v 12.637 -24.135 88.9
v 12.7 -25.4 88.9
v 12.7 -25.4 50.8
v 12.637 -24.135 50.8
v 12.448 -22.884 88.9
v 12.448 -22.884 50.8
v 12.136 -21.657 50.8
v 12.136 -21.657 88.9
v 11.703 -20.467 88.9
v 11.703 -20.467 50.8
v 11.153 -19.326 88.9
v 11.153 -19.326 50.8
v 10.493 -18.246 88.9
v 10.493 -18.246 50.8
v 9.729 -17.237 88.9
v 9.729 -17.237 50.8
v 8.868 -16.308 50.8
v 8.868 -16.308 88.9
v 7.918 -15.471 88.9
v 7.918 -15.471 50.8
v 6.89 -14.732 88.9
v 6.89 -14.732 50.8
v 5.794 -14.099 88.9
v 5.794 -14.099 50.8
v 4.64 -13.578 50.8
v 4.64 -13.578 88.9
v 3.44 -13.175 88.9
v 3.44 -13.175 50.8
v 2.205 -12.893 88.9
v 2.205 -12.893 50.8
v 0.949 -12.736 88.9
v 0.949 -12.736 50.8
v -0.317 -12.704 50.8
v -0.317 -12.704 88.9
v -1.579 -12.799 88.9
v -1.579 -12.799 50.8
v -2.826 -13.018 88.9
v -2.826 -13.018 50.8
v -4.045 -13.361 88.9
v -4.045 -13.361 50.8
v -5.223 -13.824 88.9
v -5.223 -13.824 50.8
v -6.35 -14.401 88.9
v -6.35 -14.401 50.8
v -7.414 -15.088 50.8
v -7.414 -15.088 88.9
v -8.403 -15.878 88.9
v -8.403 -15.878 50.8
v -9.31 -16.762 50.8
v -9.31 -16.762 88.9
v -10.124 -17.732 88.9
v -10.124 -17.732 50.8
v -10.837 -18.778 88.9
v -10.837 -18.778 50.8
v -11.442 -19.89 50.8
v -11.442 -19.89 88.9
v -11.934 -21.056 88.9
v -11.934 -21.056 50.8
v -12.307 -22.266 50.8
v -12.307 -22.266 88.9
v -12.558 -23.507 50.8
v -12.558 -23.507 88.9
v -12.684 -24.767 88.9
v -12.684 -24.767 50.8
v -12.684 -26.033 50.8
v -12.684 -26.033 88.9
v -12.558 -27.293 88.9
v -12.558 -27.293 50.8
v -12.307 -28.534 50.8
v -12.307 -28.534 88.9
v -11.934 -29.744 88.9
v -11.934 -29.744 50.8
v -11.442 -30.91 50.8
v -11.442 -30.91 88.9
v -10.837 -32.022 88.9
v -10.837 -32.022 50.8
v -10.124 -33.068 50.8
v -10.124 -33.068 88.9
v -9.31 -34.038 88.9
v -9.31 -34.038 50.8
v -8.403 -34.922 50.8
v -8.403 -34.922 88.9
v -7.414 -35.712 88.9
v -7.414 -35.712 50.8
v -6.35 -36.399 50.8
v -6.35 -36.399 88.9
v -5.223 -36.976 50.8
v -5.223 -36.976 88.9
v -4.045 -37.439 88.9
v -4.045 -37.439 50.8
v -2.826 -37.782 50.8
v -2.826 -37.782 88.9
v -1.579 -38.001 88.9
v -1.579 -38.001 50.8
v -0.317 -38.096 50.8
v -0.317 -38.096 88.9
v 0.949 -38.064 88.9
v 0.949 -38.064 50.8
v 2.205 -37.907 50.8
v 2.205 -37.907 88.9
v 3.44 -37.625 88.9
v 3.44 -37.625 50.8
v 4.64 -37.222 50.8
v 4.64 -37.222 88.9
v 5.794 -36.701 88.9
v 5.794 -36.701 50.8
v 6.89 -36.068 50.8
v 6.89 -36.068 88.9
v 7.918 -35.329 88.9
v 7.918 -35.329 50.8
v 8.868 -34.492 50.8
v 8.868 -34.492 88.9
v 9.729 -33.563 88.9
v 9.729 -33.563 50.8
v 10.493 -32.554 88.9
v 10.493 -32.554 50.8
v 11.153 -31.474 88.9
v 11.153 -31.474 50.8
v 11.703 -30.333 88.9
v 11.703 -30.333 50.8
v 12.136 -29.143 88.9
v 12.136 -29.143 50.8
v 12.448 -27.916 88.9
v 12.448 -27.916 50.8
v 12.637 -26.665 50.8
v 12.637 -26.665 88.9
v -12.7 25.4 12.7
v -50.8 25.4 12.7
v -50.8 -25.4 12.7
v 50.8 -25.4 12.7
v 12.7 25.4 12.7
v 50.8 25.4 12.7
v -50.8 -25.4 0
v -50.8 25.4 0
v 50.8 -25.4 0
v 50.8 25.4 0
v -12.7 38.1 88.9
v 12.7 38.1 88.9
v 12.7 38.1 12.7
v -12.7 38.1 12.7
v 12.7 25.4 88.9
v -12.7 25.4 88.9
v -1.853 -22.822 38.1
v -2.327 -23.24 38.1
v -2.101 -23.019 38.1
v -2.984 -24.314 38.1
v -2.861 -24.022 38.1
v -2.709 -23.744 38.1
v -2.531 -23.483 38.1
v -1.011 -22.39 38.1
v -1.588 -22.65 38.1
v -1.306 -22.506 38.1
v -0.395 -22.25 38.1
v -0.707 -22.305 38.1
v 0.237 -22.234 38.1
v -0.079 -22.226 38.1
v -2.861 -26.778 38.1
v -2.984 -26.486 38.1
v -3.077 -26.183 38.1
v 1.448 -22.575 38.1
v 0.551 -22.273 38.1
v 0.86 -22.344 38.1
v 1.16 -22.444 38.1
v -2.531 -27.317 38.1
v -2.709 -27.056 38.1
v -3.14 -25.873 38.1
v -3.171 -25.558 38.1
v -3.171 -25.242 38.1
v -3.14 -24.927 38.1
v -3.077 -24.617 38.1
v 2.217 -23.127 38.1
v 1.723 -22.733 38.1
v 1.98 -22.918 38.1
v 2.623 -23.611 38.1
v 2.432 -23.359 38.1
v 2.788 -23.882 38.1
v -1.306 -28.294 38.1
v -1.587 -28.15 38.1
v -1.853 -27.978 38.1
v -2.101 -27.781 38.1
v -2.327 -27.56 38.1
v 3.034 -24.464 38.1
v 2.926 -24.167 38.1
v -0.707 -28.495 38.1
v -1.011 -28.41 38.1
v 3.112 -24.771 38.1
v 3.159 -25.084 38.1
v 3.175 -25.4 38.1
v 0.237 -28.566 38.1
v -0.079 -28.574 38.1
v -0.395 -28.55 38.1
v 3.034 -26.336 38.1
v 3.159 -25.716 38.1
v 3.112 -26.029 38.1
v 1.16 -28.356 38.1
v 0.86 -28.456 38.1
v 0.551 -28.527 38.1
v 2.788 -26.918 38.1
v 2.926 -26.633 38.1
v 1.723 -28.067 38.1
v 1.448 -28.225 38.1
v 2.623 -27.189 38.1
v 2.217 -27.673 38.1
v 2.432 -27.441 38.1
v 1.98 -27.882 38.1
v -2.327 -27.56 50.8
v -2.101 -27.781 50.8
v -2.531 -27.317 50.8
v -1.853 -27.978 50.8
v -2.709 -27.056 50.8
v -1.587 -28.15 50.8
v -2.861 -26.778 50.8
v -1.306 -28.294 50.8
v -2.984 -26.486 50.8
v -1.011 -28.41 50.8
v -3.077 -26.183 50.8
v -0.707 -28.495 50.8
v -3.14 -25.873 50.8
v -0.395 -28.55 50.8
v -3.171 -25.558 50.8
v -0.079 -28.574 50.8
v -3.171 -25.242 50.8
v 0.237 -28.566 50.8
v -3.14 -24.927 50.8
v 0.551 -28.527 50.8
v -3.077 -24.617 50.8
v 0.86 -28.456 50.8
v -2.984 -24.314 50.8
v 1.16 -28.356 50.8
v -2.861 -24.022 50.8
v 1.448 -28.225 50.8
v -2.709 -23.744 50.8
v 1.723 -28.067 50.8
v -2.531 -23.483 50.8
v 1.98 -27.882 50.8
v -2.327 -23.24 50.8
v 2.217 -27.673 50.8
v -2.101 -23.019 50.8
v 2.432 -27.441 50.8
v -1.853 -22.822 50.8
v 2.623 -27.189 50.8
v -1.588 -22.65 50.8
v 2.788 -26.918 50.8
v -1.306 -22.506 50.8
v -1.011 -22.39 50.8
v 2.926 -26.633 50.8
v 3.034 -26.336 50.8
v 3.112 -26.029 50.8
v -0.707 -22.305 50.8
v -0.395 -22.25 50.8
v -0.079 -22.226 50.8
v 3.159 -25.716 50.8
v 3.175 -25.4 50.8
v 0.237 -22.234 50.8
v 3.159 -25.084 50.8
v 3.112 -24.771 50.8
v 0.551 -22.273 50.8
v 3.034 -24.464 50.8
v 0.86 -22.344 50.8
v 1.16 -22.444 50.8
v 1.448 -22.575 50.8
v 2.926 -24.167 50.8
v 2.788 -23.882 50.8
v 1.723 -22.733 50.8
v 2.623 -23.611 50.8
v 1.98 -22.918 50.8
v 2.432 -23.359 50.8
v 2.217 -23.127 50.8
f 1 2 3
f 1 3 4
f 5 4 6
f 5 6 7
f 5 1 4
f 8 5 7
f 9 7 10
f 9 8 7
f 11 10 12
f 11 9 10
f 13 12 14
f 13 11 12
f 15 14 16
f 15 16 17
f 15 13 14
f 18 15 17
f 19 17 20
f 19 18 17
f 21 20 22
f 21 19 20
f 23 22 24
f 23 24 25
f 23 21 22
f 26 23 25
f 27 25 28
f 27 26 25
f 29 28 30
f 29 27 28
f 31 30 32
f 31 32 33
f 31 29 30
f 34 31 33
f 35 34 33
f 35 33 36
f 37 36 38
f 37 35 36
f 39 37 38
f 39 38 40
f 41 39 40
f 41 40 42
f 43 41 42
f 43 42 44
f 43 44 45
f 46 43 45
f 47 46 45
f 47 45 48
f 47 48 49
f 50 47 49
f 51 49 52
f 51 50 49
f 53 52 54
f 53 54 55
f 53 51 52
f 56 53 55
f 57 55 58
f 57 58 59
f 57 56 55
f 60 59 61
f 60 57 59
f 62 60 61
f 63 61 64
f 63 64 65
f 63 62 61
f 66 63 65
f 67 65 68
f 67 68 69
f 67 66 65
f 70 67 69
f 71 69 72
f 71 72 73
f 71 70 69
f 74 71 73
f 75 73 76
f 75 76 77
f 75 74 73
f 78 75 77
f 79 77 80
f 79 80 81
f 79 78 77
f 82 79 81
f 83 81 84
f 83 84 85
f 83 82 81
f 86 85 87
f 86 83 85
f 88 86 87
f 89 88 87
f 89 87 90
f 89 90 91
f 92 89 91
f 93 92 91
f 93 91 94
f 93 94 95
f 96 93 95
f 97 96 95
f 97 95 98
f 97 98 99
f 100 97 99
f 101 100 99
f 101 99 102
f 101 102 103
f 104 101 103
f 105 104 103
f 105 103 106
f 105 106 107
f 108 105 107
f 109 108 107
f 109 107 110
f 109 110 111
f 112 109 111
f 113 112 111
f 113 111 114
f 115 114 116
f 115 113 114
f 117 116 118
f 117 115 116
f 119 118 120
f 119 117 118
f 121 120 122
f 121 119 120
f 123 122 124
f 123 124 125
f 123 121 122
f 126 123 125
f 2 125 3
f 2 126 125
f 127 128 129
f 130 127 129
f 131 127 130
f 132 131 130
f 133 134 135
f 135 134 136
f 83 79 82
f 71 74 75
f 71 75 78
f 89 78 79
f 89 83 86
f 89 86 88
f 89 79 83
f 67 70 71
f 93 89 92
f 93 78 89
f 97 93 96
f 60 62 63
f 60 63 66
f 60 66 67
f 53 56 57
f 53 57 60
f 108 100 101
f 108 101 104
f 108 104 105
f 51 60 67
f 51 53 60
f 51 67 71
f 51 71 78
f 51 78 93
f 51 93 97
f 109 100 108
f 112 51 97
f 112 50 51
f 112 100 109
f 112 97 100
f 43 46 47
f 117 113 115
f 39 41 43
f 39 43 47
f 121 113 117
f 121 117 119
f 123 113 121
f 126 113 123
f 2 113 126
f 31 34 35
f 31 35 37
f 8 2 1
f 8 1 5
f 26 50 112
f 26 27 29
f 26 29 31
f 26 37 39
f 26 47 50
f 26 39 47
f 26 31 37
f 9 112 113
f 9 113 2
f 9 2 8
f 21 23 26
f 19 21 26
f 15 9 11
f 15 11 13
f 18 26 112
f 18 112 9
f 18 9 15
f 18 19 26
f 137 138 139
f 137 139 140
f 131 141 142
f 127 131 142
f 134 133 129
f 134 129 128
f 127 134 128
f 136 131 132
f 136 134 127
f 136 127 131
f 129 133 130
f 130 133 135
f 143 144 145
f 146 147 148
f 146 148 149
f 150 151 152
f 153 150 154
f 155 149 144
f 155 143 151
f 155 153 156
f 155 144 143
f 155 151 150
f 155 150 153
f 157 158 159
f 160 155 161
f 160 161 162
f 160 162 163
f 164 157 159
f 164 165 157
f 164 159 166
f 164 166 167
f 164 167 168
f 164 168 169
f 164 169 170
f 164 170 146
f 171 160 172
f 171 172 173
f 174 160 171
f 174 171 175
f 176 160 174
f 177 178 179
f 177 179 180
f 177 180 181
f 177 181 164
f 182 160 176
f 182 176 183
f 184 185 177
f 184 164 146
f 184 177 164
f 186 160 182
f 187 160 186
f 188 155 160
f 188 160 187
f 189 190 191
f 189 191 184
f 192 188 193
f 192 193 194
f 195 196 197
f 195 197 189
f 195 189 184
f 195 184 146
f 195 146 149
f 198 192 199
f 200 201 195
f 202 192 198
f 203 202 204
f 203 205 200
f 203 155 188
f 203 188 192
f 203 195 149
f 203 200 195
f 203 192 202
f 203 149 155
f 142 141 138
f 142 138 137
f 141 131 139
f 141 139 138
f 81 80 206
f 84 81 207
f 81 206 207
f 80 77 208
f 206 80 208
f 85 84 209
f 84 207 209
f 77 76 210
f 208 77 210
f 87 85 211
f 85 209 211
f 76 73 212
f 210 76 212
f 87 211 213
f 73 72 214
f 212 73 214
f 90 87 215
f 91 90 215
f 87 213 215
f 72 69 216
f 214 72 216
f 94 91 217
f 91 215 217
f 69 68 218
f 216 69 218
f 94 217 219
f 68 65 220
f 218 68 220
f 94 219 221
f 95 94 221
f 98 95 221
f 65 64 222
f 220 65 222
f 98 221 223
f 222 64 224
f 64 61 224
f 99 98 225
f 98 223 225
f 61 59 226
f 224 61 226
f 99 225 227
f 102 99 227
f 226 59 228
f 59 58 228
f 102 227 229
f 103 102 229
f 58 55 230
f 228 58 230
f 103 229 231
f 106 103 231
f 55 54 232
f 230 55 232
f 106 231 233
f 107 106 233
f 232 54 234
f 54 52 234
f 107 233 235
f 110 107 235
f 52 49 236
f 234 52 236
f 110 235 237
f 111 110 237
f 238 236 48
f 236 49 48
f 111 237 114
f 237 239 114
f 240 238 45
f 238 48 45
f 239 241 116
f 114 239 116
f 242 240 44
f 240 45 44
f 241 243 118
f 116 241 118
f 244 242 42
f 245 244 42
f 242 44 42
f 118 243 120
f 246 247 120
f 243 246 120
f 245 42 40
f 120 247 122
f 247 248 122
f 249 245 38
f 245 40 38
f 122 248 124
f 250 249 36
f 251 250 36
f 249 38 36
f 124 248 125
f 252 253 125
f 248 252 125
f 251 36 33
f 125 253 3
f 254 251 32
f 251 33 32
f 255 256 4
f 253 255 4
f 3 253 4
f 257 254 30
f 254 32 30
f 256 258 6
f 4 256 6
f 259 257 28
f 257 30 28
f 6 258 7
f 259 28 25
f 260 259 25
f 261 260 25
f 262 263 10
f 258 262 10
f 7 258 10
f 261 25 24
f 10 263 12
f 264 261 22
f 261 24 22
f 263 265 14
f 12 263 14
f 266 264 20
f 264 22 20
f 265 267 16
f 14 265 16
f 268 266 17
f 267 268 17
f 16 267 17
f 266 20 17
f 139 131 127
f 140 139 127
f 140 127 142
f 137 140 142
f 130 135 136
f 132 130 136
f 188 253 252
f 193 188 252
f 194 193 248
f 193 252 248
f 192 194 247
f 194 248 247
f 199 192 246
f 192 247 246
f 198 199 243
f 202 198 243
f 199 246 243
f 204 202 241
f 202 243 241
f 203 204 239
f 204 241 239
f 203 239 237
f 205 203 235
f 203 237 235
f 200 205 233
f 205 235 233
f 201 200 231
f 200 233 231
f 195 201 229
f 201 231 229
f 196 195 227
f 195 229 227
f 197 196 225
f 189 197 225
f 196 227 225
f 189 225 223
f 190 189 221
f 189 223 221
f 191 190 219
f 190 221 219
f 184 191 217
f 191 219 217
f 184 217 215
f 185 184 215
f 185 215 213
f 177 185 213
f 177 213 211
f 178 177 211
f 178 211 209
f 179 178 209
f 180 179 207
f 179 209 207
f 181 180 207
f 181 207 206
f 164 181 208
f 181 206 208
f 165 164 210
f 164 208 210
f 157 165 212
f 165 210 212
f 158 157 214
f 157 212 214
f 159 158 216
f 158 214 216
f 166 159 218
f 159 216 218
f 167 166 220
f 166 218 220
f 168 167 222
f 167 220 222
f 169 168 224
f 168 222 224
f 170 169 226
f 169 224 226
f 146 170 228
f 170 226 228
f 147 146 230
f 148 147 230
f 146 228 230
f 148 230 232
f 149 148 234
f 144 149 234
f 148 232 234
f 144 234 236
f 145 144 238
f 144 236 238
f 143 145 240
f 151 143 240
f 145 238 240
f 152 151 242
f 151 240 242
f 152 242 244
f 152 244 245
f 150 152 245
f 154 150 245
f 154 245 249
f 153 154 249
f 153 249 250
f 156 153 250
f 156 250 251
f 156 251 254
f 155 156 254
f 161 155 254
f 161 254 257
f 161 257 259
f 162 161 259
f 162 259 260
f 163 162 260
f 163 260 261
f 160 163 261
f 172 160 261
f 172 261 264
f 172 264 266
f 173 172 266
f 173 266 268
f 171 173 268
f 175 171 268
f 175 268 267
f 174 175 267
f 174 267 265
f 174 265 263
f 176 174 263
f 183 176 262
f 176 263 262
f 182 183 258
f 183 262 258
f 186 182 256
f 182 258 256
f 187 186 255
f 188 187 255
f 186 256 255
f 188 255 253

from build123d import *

# Parameters (mm, degrees)
F0_W     = 101.6
F0_H     = 50.8
F1_DEPTH = 12.7
F2_W     = 25.4
F2_H     = 76.2
F3_DEPTH = 12.7
F4_R     = 12.7
F5_DEPTH = 38.1
F6_R     = 3.175
F7_DEPTH = 12.7


with BuildPart() as f1:
    # F0 (on Top) → F1 (new body)
    with BuildSketch(Plane.XY):
        Rectangle(F0_W, F0_H)
    extrude(amount=F1_DEPTH)

    # F2 (on face) → F3 (join)
    with BuildSketch(Plane(origin=(0, 25.4, 0), x_dir=(-1, 0, 0), z_dir=(0, 1, 0))):
        with Locations((0, 50.8)):
            Rectangle(F2_W, F2_H)
    extrude(amount=F3_DEPTH)


with BuildPart() as f5:
    # F4 (on face) → F5 (new body)
    with BuildSketch(Plane.XY.offset(88.9)):
        with Locations((0, -25.4)):
            Circle(F4_R)
    extrude(amount=-F5_DEPTH)

    # F6 (on face) → F7 (join)
    with BuildSketch(Plane(origin=(0, 0, 50.8), x_dir=(1, 0, 0), z_dir=(0, 0, -1))):
        with Locations((0, 25.4)):
            Circle(F6_R)
    extrude(amount=F7_DEPTH)


solid = Compound([f1.part, f5.part])
